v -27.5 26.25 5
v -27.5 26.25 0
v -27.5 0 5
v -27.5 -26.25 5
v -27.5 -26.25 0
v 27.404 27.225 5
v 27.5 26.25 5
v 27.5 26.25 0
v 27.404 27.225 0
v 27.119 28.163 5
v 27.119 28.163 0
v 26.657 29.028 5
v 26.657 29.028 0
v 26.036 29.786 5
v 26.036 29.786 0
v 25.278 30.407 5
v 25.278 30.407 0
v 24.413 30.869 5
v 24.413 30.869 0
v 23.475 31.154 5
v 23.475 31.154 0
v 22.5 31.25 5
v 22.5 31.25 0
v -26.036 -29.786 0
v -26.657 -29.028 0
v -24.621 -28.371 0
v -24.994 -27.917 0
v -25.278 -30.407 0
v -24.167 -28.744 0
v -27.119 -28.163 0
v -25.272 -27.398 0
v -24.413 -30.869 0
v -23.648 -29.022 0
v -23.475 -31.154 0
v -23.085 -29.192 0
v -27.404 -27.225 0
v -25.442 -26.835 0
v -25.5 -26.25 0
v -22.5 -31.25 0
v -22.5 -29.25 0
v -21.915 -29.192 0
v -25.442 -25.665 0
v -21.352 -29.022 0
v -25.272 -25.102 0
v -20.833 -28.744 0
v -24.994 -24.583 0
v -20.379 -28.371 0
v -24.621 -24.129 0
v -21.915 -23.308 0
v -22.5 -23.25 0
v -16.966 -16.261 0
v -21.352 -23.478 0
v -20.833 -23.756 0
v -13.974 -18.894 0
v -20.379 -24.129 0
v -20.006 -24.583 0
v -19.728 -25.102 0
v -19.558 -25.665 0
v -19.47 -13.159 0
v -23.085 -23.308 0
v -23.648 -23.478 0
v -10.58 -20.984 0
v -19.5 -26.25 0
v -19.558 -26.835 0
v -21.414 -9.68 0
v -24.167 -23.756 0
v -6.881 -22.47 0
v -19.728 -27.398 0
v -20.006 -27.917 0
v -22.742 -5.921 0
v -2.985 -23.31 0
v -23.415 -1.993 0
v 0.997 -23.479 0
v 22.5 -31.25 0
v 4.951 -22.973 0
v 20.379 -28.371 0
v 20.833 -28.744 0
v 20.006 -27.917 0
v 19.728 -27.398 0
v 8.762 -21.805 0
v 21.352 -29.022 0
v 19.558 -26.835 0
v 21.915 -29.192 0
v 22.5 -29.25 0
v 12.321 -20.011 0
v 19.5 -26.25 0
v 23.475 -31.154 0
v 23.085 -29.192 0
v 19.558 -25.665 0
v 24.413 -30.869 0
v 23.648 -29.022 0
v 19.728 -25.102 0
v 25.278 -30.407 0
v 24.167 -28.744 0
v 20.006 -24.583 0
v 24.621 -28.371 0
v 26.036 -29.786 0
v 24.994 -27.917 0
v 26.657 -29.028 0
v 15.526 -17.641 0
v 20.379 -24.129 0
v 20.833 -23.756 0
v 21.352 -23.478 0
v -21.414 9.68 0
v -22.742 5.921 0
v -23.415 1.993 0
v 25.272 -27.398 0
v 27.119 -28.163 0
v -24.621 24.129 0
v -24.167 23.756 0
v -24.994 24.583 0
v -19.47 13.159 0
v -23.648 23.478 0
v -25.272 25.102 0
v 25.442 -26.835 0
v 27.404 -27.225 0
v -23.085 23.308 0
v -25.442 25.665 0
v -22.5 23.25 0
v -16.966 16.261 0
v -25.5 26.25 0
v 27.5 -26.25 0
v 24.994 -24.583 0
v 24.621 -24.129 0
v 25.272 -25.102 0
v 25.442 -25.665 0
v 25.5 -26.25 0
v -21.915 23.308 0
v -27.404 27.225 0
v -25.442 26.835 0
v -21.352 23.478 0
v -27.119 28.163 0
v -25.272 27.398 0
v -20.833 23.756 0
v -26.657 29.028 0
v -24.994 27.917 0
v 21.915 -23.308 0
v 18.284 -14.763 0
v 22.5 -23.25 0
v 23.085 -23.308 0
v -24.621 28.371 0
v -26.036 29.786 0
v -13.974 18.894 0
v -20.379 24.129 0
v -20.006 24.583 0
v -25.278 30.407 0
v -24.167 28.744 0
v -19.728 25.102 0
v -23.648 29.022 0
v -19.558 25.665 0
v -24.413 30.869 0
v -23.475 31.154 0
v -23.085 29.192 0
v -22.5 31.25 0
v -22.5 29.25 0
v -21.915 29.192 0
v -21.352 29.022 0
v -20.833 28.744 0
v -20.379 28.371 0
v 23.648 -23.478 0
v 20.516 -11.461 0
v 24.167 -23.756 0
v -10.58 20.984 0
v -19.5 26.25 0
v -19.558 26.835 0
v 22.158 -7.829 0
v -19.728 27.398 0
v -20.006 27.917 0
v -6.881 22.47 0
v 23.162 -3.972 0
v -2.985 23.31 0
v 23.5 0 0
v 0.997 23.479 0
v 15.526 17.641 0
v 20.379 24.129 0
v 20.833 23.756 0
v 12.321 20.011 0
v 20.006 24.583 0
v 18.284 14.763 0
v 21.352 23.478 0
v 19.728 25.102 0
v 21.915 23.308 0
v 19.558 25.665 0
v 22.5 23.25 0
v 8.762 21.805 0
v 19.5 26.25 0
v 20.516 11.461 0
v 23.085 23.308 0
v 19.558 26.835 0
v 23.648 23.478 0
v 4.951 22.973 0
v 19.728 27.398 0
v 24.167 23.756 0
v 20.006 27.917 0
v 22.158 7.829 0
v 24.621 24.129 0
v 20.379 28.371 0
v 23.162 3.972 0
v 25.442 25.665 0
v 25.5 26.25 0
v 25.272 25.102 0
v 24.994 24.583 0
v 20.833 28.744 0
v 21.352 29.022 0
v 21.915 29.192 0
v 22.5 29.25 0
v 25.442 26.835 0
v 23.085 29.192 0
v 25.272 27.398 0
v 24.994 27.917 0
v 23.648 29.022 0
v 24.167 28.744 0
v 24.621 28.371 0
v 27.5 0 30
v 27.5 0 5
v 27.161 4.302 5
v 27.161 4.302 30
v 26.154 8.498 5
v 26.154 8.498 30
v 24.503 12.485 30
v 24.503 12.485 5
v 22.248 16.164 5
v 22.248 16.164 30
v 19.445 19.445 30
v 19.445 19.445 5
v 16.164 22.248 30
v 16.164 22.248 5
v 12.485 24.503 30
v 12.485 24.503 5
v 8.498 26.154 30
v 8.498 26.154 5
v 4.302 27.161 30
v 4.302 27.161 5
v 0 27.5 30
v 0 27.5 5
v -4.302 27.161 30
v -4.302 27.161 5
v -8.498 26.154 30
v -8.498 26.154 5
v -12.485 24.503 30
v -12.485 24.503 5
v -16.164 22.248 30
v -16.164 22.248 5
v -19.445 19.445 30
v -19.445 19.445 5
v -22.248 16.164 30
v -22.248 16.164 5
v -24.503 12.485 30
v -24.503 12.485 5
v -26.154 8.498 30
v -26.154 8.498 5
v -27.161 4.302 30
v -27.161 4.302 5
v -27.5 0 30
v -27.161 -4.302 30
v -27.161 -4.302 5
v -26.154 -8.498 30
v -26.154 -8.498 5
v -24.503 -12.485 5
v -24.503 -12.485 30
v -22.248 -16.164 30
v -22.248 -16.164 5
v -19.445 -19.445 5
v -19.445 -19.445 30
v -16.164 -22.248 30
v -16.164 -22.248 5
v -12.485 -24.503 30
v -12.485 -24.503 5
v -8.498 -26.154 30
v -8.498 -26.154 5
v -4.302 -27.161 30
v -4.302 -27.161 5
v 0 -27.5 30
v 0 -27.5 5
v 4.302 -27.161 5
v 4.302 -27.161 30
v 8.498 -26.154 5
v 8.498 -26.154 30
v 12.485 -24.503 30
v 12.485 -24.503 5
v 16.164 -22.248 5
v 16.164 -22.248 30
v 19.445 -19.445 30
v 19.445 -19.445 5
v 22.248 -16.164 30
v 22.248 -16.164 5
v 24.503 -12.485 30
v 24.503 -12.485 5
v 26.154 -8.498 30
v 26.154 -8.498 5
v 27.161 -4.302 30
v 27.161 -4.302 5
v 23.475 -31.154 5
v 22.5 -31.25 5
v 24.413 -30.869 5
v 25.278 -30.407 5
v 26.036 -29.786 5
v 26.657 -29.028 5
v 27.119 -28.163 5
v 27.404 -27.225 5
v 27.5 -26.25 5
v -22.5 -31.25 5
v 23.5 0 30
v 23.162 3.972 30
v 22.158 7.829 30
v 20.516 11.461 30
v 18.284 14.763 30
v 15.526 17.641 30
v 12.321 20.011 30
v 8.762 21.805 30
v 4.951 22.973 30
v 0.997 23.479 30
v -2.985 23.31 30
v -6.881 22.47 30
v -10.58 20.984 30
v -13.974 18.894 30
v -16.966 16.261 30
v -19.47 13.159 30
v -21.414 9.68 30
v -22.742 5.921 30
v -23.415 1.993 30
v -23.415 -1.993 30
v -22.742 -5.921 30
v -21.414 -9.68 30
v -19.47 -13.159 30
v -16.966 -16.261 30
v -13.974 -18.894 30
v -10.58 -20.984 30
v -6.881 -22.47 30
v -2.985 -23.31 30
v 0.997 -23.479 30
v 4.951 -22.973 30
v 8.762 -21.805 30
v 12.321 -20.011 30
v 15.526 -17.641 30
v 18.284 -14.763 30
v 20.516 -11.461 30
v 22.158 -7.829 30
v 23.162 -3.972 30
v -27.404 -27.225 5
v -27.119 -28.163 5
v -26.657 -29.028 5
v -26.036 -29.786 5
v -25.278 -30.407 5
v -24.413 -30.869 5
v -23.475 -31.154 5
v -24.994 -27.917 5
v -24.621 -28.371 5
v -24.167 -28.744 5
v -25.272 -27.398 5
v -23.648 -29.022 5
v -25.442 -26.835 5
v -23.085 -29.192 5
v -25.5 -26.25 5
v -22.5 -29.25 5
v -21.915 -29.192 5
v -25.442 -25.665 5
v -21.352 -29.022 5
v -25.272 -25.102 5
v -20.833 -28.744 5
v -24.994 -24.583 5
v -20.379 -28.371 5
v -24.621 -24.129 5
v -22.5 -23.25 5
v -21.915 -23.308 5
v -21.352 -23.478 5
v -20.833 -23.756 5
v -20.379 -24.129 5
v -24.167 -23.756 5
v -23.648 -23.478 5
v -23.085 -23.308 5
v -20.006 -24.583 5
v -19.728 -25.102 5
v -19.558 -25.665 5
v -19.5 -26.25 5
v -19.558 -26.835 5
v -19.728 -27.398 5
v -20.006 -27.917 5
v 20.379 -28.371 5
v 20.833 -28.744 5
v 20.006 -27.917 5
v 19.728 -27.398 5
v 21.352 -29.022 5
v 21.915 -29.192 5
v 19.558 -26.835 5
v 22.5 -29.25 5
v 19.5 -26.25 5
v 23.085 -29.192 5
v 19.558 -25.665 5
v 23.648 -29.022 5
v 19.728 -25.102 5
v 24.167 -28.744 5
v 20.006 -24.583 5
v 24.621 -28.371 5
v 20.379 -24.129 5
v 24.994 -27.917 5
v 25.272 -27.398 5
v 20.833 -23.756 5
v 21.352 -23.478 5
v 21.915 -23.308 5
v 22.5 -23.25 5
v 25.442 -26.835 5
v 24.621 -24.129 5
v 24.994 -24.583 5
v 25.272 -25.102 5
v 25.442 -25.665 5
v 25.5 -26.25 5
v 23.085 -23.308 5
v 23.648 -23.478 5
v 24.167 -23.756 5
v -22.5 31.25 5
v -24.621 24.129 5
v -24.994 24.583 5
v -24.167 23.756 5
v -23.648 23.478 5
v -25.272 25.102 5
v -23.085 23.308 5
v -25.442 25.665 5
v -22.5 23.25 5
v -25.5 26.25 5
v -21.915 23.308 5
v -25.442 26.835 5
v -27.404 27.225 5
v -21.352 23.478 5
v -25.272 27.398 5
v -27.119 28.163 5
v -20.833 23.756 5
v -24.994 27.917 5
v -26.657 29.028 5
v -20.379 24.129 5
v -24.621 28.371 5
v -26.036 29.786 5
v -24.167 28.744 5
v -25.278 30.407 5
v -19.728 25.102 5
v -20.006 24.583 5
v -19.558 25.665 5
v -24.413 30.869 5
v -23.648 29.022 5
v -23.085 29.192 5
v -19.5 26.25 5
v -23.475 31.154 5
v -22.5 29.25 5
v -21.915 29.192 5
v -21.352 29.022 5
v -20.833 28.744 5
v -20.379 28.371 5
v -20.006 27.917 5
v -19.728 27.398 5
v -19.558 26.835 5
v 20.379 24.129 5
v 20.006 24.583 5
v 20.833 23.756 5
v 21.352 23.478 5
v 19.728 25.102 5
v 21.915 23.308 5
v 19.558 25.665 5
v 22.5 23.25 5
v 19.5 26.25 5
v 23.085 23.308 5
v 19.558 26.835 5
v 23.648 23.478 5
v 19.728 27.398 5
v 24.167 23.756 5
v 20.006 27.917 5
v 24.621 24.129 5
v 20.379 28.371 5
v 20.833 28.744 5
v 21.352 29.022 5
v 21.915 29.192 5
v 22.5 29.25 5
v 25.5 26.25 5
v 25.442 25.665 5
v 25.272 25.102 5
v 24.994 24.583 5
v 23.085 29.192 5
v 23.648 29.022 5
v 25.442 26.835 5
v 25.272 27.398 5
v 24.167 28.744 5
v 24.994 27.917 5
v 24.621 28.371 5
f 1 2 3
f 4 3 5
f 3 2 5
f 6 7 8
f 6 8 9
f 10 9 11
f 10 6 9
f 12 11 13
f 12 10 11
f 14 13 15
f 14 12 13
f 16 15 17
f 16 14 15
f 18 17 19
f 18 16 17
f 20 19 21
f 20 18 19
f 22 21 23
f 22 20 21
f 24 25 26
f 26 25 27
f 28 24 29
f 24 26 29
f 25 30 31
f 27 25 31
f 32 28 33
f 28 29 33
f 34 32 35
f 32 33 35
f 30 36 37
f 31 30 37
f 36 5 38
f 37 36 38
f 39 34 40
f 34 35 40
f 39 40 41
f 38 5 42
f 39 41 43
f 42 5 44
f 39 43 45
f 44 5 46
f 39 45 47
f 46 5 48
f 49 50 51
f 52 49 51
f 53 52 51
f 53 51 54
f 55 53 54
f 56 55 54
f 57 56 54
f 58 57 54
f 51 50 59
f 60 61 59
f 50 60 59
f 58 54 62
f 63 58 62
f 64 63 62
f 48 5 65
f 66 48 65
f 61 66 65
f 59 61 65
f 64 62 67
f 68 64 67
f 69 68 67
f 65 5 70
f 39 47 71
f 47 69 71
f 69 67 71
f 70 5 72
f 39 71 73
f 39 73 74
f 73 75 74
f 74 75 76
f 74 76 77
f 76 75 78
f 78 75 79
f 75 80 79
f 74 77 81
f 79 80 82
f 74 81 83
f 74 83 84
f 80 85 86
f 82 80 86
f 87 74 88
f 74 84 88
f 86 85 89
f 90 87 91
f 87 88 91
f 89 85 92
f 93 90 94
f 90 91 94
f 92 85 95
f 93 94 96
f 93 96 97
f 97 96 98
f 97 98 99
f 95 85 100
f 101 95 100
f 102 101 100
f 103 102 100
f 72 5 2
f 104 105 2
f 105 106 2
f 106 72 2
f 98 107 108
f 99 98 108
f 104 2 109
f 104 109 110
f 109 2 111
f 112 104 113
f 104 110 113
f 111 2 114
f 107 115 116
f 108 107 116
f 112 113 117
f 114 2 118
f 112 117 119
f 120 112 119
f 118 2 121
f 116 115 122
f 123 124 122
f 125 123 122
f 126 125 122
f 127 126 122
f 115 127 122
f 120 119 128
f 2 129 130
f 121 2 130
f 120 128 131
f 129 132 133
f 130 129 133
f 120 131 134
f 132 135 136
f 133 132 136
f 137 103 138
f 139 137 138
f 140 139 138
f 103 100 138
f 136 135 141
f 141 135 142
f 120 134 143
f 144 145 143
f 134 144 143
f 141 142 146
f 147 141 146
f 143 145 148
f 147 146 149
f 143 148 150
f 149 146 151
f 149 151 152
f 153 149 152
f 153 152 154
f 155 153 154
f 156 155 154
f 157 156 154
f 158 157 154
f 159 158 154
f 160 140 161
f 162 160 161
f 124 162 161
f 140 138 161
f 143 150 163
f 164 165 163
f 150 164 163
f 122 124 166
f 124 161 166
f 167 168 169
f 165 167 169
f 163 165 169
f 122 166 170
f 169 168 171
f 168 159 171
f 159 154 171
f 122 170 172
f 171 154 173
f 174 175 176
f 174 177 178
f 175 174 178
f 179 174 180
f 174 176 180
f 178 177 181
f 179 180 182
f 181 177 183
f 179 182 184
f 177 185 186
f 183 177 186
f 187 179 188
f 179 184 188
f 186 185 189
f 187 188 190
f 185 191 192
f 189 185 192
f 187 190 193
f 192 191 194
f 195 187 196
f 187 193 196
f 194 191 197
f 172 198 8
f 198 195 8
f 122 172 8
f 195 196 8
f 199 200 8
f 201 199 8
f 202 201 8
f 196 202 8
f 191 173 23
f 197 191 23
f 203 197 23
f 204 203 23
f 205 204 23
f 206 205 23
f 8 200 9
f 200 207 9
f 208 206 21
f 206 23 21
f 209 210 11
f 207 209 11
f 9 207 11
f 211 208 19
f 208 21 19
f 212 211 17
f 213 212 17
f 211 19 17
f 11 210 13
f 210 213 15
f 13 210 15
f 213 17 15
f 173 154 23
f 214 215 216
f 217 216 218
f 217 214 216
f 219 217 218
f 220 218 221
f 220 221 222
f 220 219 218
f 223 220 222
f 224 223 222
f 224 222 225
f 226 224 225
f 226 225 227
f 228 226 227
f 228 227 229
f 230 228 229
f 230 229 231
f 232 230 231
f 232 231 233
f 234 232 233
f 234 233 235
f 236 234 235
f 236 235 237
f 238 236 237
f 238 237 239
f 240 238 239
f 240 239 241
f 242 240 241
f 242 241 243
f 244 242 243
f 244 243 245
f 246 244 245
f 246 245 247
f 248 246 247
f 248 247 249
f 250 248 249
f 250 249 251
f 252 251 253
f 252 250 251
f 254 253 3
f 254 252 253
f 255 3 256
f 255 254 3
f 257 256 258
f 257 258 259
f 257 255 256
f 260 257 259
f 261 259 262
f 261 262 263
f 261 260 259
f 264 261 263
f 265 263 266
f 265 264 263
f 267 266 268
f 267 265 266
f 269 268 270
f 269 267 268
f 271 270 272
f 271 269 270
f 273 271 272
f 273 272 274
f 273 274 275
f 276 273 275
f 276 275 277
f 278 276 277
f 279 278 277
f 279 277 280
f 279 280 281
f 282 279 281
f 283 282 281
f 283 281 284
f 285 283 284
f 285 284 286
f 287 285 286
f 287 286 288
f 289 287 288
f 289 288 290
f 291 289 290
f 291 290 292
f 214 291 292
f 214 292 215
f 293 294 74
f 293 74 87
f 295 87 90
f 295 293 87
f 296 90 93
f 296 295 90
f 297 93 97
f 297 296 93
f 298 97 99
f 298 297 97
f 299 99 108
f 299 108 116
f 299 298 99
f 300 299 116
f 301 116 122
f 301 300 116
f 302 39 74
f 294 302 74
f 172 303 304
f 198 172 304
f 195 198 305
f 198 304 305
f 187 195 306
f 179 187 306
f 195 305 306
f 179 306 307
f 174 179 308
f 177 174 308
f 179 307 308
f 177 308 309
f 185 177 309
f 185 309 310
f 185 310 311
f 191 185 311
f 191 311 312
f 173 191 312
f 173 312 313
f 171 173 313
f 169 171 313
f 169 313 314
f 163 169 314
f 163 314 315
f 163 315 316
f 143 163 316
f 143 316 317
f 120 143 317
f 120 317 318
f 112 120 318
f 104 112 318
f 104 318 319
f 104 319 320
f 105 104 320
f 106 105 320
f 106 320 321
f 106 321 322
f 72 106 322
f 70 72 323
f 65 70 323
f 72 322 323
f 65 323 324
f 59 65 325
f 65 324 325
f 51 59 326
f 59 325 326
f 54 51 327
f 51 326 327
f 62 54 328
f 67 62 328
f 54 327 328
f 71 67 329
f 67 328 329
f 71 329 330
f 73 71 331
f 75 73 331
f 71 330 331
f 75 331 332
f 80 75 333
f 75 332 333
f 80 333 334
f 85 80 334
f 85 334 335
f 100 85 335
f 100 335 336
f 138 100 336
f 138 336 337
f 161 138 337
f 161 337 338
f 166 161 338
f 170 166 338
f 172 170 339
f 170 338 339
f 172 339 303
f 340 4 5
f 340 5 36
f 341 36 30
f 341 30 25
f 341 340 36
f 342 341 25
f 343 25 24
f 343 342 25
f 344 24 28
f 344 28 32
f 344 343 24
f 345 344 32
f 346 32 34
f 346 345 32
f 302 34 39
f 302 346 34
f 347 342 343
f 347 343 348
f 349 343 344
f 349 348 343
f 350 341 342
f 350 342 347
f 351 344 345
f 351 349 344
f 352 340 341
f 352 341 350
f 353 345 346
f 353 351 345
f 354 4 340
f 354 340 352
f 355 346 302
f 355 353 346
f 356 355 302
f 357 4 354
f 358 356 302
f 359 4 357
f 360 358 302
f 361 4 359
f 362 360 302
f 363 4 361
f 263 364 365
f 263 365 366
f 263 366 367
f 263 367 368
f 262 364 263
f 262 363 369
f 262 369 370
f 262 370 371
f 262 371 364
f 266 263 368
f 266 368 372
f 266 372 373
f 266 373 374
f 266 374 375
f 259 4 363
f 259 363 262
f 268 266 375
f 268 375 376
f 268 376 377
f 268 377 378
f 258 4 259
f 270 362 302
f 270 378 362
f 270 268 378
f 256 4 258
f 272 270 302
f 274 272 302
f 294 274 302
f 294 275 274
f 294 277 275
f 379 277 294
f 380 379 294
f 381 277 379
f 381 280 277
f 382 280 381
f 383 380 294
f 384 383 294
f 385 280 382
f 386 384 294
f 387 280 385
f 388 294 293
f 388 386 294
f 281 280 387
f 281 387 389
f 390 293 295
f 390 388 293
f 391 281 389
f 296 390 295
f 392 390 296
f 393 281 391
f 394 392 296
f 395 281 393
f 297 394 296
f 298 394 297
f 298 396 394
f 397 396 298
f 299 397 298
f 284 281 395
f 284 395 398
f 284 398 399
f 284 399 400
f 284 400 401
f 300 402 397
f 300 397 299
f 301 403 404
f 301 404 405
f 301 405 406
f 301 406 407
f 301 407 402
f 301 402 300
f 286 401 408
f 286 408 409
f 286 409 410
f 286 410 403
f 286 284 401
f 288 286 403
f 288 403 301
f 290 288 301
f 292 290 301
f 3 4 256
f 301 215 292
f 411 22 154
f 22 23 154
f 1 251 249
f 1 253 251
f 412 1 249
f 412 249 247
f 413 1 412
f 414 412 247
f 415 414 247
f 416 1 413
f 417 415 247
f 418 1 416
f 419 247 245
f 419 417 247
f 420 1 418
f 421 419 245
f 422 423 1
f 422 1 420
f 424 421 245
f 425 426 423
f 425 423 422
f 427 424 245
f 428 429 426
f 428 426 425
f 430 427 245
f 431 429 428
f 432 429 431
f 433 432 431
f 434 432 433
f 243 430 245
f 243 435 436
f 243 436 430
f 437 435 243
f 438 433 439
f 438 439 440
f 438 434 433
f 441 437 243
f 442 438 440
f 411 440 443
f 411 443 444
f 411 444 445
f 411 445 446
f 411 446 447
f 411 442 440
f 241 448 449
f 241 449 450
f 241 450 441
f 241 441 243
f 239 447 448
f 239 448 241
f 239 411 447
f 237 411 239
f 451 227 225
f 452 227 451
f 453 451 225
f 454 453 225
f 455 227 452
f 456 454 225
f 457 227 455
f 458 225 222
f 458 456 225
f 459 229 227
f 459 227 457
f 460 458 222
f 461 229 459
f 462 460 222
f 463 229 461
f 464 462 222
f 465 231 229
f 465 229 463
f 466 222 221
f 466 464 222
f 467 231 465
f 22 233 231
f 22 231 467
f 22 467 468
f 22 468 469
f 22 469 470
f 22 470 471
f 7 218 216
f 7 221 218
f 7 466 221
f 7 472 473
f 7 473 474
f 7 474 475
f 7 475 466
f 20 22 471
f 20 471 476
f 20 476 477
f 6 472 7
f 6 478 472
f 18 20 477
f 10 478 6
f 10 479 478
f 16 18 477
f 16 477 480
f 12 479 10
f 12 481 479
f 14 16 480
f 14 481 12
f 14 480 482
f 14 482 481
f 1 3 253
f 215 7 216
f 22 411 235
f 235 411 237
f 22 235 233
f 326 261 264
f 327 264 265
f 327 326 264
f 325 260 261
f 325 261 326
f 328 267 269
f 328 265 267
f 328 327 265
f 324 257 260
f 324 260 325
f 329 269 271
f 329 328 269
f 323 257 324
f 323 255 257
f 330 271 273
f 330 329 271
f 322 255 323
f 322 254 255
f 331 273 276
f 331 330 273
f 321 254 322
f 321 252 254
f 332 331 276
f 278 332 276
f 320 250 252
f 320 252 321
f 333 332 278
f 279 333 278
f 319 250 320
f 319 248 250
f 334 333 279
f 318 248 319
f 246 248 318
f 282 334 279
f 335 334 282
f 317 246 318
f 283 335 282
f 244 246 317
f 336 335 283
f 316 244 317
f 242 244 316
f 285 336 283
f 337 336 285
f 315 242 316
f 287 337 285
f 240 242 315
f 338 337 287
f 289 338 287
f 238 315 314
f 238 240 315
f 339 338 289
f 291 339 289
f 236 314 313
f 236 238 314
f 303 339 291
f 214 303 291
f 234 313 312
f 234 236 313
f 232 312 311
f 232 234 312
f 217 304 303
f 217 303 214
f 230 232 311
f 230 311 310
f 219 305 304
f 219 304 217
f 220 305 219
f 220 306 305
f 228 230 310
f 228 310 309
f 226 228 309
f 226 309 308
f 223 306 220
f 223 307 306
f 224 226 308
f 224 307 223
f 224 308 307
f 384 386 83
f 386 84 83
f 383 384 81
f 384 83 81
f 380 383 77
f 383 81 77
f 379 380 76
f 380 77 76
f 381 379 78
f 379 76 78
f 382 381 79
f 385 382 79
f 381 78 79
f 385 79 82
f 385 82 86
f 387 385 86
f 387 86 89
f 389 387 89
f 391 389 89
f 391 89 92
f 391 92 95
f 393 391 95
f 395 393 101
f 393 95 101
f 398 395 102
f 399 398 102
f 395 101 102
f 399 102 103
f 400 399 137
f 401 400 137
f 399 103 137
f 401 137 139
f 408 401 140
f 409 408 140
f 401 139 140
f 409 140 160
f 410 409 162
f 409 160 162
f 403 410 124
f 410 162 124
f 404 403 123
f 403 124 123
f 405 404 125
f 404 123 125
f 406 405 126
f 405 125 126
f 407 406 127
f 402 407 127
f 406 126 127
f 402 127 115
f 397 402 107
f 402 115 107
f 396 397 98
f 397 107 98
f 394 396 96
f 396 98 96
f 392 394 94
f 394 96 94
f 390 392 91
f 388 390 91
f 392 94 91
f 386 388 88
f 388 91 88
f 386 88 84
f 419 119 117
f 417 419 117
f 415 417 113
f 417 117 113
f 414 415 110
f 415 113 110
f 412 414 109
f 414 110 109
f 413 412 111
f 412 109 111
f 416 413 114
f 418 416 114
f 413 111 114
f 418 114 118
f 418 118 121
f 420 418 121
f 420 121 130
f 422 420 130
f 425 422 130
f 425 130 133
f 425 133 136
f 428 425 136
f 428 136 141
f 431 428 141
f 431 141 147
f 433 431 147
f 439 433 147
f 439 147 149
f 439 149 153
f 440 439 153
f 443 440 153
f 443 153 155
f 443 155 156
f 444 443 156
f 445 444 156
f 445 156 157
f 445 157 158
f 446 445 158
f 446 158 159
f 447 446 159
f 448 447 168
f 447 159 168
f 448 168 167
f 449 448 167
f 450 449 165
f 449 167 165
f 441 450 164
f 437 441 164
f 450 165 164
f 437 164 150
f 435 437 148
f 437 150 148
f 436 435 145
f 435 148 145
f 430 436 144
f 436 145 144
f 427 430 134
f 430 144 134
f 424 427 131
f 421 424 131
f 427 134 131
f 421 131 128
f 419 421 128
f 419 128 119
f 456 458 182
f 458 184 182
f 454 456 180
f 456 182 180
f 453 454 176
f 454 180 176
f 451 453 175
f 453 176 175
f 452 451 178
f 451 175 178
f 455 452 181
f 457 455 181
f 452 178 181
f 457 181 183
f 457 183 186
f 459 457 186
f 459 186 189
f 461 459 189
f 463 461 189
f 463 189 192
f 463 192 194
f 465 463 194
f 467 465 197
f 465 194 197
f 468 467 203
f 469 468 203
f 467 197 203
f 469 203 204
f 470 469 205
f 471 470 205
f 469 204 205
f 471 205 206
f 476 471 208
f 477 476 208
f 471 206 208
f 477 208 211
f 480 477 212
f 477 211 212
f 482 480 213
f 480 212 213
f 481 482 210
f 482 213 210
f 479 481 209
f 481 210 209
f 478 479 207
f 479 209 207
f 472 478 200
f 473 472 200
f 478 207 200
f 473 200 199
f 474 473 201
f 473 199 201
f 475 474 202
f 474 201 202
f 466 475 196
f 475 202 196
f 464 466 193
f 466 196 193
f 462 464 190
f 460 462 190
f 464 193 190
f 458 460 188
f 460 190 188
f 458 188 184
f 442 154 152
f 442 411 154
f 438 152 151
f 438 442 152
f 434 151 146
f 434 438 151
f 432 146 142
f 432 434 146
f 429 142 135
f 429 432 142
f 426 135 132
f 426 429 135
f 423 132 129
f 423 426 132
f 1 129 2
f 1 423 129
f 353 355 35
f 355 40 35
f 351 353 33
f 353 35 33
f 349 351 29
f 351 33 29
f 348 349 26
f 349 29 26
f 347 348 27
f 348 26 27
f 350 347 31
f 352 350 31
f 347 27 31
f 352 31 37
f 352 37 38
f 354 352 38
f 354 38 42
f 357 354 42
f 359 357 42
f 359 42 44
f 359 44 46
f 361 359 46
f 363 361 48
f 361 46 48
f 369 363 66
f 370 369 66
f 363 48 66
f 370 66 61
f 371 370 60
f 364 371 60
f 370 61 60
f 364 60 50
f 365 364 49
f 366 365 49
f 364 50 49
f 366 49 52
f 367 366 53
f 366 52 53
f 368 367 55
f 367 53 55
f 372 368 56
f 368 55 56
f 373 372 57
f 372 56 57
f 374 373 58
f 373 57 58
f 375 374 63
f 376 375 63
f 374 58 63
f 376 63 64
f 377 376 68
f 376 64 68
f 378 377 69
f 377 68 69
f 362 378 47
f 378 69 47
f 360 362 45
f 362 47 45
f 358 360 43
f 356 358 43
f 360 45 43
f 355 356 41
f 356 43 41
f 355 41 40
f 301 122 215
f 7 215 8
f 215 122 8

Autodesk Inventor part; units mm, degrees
ref_plane "YZ Plane" through (0, 0, 0) normal (1, 0, 0) x (0, 1, 0)
ref_plane "XZ Plane" through (0, 0, 0) normal (0, 1, 0) x (-1, 0, 0)
ref_plane "XY Plane" through (0, 0, 0) normal (0, 0, 1) x (1, 0, 0)
sketch "Skizze1" plane through (0, 0, 0) normal (0, 0, 1) x (1, 0, 0)
  line L0 (-27.5, -31.25) -> (27.5, -31.25)
  line L1 (27.5, -31.25) -> (27.5, 31.25)
  line L2 (27.5, 31.25) -> (-27.5, 31.25)
  line L3 (-27.5, 31.25) -> (-27.5, -31.25)
  point P0 (0, 0)
  point P1 (-27.5, 0)
  point P2 (0, -31.25)
  dimension "d5" = 55
  dimension "d6" = 62.5
extrude "Extrusion1" add sketch "Skizze1" along normal blind 30
sketch "Skizze2" plane through (0, 0, 30) normal (0, 0, 1) x (1, 0, 0)
  line L0 (-22.5, -26.25) -> (22.5, -26.25)
  line L1 (22.5, -26.25) -> (22.5, 26.25)
  line L2 (22.5, 26.25) -> (-22.5, 26.25)
  line L3 (-22.5, 26.25) -> (-22.5, -26.25)
  point P0 (0, 0)
  point P1 (0, 26.25)
  point P2 (-22.5, 0)
  dimension "d3" = 45
  dimension "d4" = 52.5
hole "Bohrung1" at (-22.5, 26.25, 30) at (-22.5, -26.25, 30) at (22.5, -26.25, 30) at (22.5, 26.25, 30) direction (0, 0, -1) diameter 6 end through all
sketch "Skizze3" plane through (0, 0, 30) normal (0, 0, 1) x (1, 0, 0)
  circle A0 centre (0, 0) radius 27.5
  circle A1 centre (22.5, -26.25) radius 3 projected
  circle A2 centre (-22.5, 26.25) radius 3 projected
  circle A3 centre (-22.5, -26.25) radius 3 projected
  circle A4 centre (22.5, 26.25) radius 3 projected
  line L0 (-27.5, -31.25) -> (27.5, -31.25) projected
  line L1 (27.5, -31.25) -> (27.5, 31.25) projected
  line L2 (27.5, 31.25) -> (-27.5, 31.25) projected
  line L3 (-27.5, 31.25) -> (-27.5, -31.25) projected
  dimension "d14" = 55
extrude "Extrusion2" cut sketch "Skizze3" against normal blind 25 contours L1 L0 L3 A0 | A0 L3 L2 L1
sketch "Skizze4" plane through (0, 0, 30) normal (0, 0, 1) x (1, 0, 0)
  circle A0 centre (0, 0) radius 23.5
  dimension "d17" = 47
extrude "Extrusion3" cut sketch "Skizze4" against normal through all
fillet "Rundung1" radius 5 4 edges at (-27.5, -31.25, 2.5) (27.5, -31.25, 2.5) (27.5, 31.25, 2.5) (-27.5, 31.25, 2.5)
properties part number "Rohrhalterung"
